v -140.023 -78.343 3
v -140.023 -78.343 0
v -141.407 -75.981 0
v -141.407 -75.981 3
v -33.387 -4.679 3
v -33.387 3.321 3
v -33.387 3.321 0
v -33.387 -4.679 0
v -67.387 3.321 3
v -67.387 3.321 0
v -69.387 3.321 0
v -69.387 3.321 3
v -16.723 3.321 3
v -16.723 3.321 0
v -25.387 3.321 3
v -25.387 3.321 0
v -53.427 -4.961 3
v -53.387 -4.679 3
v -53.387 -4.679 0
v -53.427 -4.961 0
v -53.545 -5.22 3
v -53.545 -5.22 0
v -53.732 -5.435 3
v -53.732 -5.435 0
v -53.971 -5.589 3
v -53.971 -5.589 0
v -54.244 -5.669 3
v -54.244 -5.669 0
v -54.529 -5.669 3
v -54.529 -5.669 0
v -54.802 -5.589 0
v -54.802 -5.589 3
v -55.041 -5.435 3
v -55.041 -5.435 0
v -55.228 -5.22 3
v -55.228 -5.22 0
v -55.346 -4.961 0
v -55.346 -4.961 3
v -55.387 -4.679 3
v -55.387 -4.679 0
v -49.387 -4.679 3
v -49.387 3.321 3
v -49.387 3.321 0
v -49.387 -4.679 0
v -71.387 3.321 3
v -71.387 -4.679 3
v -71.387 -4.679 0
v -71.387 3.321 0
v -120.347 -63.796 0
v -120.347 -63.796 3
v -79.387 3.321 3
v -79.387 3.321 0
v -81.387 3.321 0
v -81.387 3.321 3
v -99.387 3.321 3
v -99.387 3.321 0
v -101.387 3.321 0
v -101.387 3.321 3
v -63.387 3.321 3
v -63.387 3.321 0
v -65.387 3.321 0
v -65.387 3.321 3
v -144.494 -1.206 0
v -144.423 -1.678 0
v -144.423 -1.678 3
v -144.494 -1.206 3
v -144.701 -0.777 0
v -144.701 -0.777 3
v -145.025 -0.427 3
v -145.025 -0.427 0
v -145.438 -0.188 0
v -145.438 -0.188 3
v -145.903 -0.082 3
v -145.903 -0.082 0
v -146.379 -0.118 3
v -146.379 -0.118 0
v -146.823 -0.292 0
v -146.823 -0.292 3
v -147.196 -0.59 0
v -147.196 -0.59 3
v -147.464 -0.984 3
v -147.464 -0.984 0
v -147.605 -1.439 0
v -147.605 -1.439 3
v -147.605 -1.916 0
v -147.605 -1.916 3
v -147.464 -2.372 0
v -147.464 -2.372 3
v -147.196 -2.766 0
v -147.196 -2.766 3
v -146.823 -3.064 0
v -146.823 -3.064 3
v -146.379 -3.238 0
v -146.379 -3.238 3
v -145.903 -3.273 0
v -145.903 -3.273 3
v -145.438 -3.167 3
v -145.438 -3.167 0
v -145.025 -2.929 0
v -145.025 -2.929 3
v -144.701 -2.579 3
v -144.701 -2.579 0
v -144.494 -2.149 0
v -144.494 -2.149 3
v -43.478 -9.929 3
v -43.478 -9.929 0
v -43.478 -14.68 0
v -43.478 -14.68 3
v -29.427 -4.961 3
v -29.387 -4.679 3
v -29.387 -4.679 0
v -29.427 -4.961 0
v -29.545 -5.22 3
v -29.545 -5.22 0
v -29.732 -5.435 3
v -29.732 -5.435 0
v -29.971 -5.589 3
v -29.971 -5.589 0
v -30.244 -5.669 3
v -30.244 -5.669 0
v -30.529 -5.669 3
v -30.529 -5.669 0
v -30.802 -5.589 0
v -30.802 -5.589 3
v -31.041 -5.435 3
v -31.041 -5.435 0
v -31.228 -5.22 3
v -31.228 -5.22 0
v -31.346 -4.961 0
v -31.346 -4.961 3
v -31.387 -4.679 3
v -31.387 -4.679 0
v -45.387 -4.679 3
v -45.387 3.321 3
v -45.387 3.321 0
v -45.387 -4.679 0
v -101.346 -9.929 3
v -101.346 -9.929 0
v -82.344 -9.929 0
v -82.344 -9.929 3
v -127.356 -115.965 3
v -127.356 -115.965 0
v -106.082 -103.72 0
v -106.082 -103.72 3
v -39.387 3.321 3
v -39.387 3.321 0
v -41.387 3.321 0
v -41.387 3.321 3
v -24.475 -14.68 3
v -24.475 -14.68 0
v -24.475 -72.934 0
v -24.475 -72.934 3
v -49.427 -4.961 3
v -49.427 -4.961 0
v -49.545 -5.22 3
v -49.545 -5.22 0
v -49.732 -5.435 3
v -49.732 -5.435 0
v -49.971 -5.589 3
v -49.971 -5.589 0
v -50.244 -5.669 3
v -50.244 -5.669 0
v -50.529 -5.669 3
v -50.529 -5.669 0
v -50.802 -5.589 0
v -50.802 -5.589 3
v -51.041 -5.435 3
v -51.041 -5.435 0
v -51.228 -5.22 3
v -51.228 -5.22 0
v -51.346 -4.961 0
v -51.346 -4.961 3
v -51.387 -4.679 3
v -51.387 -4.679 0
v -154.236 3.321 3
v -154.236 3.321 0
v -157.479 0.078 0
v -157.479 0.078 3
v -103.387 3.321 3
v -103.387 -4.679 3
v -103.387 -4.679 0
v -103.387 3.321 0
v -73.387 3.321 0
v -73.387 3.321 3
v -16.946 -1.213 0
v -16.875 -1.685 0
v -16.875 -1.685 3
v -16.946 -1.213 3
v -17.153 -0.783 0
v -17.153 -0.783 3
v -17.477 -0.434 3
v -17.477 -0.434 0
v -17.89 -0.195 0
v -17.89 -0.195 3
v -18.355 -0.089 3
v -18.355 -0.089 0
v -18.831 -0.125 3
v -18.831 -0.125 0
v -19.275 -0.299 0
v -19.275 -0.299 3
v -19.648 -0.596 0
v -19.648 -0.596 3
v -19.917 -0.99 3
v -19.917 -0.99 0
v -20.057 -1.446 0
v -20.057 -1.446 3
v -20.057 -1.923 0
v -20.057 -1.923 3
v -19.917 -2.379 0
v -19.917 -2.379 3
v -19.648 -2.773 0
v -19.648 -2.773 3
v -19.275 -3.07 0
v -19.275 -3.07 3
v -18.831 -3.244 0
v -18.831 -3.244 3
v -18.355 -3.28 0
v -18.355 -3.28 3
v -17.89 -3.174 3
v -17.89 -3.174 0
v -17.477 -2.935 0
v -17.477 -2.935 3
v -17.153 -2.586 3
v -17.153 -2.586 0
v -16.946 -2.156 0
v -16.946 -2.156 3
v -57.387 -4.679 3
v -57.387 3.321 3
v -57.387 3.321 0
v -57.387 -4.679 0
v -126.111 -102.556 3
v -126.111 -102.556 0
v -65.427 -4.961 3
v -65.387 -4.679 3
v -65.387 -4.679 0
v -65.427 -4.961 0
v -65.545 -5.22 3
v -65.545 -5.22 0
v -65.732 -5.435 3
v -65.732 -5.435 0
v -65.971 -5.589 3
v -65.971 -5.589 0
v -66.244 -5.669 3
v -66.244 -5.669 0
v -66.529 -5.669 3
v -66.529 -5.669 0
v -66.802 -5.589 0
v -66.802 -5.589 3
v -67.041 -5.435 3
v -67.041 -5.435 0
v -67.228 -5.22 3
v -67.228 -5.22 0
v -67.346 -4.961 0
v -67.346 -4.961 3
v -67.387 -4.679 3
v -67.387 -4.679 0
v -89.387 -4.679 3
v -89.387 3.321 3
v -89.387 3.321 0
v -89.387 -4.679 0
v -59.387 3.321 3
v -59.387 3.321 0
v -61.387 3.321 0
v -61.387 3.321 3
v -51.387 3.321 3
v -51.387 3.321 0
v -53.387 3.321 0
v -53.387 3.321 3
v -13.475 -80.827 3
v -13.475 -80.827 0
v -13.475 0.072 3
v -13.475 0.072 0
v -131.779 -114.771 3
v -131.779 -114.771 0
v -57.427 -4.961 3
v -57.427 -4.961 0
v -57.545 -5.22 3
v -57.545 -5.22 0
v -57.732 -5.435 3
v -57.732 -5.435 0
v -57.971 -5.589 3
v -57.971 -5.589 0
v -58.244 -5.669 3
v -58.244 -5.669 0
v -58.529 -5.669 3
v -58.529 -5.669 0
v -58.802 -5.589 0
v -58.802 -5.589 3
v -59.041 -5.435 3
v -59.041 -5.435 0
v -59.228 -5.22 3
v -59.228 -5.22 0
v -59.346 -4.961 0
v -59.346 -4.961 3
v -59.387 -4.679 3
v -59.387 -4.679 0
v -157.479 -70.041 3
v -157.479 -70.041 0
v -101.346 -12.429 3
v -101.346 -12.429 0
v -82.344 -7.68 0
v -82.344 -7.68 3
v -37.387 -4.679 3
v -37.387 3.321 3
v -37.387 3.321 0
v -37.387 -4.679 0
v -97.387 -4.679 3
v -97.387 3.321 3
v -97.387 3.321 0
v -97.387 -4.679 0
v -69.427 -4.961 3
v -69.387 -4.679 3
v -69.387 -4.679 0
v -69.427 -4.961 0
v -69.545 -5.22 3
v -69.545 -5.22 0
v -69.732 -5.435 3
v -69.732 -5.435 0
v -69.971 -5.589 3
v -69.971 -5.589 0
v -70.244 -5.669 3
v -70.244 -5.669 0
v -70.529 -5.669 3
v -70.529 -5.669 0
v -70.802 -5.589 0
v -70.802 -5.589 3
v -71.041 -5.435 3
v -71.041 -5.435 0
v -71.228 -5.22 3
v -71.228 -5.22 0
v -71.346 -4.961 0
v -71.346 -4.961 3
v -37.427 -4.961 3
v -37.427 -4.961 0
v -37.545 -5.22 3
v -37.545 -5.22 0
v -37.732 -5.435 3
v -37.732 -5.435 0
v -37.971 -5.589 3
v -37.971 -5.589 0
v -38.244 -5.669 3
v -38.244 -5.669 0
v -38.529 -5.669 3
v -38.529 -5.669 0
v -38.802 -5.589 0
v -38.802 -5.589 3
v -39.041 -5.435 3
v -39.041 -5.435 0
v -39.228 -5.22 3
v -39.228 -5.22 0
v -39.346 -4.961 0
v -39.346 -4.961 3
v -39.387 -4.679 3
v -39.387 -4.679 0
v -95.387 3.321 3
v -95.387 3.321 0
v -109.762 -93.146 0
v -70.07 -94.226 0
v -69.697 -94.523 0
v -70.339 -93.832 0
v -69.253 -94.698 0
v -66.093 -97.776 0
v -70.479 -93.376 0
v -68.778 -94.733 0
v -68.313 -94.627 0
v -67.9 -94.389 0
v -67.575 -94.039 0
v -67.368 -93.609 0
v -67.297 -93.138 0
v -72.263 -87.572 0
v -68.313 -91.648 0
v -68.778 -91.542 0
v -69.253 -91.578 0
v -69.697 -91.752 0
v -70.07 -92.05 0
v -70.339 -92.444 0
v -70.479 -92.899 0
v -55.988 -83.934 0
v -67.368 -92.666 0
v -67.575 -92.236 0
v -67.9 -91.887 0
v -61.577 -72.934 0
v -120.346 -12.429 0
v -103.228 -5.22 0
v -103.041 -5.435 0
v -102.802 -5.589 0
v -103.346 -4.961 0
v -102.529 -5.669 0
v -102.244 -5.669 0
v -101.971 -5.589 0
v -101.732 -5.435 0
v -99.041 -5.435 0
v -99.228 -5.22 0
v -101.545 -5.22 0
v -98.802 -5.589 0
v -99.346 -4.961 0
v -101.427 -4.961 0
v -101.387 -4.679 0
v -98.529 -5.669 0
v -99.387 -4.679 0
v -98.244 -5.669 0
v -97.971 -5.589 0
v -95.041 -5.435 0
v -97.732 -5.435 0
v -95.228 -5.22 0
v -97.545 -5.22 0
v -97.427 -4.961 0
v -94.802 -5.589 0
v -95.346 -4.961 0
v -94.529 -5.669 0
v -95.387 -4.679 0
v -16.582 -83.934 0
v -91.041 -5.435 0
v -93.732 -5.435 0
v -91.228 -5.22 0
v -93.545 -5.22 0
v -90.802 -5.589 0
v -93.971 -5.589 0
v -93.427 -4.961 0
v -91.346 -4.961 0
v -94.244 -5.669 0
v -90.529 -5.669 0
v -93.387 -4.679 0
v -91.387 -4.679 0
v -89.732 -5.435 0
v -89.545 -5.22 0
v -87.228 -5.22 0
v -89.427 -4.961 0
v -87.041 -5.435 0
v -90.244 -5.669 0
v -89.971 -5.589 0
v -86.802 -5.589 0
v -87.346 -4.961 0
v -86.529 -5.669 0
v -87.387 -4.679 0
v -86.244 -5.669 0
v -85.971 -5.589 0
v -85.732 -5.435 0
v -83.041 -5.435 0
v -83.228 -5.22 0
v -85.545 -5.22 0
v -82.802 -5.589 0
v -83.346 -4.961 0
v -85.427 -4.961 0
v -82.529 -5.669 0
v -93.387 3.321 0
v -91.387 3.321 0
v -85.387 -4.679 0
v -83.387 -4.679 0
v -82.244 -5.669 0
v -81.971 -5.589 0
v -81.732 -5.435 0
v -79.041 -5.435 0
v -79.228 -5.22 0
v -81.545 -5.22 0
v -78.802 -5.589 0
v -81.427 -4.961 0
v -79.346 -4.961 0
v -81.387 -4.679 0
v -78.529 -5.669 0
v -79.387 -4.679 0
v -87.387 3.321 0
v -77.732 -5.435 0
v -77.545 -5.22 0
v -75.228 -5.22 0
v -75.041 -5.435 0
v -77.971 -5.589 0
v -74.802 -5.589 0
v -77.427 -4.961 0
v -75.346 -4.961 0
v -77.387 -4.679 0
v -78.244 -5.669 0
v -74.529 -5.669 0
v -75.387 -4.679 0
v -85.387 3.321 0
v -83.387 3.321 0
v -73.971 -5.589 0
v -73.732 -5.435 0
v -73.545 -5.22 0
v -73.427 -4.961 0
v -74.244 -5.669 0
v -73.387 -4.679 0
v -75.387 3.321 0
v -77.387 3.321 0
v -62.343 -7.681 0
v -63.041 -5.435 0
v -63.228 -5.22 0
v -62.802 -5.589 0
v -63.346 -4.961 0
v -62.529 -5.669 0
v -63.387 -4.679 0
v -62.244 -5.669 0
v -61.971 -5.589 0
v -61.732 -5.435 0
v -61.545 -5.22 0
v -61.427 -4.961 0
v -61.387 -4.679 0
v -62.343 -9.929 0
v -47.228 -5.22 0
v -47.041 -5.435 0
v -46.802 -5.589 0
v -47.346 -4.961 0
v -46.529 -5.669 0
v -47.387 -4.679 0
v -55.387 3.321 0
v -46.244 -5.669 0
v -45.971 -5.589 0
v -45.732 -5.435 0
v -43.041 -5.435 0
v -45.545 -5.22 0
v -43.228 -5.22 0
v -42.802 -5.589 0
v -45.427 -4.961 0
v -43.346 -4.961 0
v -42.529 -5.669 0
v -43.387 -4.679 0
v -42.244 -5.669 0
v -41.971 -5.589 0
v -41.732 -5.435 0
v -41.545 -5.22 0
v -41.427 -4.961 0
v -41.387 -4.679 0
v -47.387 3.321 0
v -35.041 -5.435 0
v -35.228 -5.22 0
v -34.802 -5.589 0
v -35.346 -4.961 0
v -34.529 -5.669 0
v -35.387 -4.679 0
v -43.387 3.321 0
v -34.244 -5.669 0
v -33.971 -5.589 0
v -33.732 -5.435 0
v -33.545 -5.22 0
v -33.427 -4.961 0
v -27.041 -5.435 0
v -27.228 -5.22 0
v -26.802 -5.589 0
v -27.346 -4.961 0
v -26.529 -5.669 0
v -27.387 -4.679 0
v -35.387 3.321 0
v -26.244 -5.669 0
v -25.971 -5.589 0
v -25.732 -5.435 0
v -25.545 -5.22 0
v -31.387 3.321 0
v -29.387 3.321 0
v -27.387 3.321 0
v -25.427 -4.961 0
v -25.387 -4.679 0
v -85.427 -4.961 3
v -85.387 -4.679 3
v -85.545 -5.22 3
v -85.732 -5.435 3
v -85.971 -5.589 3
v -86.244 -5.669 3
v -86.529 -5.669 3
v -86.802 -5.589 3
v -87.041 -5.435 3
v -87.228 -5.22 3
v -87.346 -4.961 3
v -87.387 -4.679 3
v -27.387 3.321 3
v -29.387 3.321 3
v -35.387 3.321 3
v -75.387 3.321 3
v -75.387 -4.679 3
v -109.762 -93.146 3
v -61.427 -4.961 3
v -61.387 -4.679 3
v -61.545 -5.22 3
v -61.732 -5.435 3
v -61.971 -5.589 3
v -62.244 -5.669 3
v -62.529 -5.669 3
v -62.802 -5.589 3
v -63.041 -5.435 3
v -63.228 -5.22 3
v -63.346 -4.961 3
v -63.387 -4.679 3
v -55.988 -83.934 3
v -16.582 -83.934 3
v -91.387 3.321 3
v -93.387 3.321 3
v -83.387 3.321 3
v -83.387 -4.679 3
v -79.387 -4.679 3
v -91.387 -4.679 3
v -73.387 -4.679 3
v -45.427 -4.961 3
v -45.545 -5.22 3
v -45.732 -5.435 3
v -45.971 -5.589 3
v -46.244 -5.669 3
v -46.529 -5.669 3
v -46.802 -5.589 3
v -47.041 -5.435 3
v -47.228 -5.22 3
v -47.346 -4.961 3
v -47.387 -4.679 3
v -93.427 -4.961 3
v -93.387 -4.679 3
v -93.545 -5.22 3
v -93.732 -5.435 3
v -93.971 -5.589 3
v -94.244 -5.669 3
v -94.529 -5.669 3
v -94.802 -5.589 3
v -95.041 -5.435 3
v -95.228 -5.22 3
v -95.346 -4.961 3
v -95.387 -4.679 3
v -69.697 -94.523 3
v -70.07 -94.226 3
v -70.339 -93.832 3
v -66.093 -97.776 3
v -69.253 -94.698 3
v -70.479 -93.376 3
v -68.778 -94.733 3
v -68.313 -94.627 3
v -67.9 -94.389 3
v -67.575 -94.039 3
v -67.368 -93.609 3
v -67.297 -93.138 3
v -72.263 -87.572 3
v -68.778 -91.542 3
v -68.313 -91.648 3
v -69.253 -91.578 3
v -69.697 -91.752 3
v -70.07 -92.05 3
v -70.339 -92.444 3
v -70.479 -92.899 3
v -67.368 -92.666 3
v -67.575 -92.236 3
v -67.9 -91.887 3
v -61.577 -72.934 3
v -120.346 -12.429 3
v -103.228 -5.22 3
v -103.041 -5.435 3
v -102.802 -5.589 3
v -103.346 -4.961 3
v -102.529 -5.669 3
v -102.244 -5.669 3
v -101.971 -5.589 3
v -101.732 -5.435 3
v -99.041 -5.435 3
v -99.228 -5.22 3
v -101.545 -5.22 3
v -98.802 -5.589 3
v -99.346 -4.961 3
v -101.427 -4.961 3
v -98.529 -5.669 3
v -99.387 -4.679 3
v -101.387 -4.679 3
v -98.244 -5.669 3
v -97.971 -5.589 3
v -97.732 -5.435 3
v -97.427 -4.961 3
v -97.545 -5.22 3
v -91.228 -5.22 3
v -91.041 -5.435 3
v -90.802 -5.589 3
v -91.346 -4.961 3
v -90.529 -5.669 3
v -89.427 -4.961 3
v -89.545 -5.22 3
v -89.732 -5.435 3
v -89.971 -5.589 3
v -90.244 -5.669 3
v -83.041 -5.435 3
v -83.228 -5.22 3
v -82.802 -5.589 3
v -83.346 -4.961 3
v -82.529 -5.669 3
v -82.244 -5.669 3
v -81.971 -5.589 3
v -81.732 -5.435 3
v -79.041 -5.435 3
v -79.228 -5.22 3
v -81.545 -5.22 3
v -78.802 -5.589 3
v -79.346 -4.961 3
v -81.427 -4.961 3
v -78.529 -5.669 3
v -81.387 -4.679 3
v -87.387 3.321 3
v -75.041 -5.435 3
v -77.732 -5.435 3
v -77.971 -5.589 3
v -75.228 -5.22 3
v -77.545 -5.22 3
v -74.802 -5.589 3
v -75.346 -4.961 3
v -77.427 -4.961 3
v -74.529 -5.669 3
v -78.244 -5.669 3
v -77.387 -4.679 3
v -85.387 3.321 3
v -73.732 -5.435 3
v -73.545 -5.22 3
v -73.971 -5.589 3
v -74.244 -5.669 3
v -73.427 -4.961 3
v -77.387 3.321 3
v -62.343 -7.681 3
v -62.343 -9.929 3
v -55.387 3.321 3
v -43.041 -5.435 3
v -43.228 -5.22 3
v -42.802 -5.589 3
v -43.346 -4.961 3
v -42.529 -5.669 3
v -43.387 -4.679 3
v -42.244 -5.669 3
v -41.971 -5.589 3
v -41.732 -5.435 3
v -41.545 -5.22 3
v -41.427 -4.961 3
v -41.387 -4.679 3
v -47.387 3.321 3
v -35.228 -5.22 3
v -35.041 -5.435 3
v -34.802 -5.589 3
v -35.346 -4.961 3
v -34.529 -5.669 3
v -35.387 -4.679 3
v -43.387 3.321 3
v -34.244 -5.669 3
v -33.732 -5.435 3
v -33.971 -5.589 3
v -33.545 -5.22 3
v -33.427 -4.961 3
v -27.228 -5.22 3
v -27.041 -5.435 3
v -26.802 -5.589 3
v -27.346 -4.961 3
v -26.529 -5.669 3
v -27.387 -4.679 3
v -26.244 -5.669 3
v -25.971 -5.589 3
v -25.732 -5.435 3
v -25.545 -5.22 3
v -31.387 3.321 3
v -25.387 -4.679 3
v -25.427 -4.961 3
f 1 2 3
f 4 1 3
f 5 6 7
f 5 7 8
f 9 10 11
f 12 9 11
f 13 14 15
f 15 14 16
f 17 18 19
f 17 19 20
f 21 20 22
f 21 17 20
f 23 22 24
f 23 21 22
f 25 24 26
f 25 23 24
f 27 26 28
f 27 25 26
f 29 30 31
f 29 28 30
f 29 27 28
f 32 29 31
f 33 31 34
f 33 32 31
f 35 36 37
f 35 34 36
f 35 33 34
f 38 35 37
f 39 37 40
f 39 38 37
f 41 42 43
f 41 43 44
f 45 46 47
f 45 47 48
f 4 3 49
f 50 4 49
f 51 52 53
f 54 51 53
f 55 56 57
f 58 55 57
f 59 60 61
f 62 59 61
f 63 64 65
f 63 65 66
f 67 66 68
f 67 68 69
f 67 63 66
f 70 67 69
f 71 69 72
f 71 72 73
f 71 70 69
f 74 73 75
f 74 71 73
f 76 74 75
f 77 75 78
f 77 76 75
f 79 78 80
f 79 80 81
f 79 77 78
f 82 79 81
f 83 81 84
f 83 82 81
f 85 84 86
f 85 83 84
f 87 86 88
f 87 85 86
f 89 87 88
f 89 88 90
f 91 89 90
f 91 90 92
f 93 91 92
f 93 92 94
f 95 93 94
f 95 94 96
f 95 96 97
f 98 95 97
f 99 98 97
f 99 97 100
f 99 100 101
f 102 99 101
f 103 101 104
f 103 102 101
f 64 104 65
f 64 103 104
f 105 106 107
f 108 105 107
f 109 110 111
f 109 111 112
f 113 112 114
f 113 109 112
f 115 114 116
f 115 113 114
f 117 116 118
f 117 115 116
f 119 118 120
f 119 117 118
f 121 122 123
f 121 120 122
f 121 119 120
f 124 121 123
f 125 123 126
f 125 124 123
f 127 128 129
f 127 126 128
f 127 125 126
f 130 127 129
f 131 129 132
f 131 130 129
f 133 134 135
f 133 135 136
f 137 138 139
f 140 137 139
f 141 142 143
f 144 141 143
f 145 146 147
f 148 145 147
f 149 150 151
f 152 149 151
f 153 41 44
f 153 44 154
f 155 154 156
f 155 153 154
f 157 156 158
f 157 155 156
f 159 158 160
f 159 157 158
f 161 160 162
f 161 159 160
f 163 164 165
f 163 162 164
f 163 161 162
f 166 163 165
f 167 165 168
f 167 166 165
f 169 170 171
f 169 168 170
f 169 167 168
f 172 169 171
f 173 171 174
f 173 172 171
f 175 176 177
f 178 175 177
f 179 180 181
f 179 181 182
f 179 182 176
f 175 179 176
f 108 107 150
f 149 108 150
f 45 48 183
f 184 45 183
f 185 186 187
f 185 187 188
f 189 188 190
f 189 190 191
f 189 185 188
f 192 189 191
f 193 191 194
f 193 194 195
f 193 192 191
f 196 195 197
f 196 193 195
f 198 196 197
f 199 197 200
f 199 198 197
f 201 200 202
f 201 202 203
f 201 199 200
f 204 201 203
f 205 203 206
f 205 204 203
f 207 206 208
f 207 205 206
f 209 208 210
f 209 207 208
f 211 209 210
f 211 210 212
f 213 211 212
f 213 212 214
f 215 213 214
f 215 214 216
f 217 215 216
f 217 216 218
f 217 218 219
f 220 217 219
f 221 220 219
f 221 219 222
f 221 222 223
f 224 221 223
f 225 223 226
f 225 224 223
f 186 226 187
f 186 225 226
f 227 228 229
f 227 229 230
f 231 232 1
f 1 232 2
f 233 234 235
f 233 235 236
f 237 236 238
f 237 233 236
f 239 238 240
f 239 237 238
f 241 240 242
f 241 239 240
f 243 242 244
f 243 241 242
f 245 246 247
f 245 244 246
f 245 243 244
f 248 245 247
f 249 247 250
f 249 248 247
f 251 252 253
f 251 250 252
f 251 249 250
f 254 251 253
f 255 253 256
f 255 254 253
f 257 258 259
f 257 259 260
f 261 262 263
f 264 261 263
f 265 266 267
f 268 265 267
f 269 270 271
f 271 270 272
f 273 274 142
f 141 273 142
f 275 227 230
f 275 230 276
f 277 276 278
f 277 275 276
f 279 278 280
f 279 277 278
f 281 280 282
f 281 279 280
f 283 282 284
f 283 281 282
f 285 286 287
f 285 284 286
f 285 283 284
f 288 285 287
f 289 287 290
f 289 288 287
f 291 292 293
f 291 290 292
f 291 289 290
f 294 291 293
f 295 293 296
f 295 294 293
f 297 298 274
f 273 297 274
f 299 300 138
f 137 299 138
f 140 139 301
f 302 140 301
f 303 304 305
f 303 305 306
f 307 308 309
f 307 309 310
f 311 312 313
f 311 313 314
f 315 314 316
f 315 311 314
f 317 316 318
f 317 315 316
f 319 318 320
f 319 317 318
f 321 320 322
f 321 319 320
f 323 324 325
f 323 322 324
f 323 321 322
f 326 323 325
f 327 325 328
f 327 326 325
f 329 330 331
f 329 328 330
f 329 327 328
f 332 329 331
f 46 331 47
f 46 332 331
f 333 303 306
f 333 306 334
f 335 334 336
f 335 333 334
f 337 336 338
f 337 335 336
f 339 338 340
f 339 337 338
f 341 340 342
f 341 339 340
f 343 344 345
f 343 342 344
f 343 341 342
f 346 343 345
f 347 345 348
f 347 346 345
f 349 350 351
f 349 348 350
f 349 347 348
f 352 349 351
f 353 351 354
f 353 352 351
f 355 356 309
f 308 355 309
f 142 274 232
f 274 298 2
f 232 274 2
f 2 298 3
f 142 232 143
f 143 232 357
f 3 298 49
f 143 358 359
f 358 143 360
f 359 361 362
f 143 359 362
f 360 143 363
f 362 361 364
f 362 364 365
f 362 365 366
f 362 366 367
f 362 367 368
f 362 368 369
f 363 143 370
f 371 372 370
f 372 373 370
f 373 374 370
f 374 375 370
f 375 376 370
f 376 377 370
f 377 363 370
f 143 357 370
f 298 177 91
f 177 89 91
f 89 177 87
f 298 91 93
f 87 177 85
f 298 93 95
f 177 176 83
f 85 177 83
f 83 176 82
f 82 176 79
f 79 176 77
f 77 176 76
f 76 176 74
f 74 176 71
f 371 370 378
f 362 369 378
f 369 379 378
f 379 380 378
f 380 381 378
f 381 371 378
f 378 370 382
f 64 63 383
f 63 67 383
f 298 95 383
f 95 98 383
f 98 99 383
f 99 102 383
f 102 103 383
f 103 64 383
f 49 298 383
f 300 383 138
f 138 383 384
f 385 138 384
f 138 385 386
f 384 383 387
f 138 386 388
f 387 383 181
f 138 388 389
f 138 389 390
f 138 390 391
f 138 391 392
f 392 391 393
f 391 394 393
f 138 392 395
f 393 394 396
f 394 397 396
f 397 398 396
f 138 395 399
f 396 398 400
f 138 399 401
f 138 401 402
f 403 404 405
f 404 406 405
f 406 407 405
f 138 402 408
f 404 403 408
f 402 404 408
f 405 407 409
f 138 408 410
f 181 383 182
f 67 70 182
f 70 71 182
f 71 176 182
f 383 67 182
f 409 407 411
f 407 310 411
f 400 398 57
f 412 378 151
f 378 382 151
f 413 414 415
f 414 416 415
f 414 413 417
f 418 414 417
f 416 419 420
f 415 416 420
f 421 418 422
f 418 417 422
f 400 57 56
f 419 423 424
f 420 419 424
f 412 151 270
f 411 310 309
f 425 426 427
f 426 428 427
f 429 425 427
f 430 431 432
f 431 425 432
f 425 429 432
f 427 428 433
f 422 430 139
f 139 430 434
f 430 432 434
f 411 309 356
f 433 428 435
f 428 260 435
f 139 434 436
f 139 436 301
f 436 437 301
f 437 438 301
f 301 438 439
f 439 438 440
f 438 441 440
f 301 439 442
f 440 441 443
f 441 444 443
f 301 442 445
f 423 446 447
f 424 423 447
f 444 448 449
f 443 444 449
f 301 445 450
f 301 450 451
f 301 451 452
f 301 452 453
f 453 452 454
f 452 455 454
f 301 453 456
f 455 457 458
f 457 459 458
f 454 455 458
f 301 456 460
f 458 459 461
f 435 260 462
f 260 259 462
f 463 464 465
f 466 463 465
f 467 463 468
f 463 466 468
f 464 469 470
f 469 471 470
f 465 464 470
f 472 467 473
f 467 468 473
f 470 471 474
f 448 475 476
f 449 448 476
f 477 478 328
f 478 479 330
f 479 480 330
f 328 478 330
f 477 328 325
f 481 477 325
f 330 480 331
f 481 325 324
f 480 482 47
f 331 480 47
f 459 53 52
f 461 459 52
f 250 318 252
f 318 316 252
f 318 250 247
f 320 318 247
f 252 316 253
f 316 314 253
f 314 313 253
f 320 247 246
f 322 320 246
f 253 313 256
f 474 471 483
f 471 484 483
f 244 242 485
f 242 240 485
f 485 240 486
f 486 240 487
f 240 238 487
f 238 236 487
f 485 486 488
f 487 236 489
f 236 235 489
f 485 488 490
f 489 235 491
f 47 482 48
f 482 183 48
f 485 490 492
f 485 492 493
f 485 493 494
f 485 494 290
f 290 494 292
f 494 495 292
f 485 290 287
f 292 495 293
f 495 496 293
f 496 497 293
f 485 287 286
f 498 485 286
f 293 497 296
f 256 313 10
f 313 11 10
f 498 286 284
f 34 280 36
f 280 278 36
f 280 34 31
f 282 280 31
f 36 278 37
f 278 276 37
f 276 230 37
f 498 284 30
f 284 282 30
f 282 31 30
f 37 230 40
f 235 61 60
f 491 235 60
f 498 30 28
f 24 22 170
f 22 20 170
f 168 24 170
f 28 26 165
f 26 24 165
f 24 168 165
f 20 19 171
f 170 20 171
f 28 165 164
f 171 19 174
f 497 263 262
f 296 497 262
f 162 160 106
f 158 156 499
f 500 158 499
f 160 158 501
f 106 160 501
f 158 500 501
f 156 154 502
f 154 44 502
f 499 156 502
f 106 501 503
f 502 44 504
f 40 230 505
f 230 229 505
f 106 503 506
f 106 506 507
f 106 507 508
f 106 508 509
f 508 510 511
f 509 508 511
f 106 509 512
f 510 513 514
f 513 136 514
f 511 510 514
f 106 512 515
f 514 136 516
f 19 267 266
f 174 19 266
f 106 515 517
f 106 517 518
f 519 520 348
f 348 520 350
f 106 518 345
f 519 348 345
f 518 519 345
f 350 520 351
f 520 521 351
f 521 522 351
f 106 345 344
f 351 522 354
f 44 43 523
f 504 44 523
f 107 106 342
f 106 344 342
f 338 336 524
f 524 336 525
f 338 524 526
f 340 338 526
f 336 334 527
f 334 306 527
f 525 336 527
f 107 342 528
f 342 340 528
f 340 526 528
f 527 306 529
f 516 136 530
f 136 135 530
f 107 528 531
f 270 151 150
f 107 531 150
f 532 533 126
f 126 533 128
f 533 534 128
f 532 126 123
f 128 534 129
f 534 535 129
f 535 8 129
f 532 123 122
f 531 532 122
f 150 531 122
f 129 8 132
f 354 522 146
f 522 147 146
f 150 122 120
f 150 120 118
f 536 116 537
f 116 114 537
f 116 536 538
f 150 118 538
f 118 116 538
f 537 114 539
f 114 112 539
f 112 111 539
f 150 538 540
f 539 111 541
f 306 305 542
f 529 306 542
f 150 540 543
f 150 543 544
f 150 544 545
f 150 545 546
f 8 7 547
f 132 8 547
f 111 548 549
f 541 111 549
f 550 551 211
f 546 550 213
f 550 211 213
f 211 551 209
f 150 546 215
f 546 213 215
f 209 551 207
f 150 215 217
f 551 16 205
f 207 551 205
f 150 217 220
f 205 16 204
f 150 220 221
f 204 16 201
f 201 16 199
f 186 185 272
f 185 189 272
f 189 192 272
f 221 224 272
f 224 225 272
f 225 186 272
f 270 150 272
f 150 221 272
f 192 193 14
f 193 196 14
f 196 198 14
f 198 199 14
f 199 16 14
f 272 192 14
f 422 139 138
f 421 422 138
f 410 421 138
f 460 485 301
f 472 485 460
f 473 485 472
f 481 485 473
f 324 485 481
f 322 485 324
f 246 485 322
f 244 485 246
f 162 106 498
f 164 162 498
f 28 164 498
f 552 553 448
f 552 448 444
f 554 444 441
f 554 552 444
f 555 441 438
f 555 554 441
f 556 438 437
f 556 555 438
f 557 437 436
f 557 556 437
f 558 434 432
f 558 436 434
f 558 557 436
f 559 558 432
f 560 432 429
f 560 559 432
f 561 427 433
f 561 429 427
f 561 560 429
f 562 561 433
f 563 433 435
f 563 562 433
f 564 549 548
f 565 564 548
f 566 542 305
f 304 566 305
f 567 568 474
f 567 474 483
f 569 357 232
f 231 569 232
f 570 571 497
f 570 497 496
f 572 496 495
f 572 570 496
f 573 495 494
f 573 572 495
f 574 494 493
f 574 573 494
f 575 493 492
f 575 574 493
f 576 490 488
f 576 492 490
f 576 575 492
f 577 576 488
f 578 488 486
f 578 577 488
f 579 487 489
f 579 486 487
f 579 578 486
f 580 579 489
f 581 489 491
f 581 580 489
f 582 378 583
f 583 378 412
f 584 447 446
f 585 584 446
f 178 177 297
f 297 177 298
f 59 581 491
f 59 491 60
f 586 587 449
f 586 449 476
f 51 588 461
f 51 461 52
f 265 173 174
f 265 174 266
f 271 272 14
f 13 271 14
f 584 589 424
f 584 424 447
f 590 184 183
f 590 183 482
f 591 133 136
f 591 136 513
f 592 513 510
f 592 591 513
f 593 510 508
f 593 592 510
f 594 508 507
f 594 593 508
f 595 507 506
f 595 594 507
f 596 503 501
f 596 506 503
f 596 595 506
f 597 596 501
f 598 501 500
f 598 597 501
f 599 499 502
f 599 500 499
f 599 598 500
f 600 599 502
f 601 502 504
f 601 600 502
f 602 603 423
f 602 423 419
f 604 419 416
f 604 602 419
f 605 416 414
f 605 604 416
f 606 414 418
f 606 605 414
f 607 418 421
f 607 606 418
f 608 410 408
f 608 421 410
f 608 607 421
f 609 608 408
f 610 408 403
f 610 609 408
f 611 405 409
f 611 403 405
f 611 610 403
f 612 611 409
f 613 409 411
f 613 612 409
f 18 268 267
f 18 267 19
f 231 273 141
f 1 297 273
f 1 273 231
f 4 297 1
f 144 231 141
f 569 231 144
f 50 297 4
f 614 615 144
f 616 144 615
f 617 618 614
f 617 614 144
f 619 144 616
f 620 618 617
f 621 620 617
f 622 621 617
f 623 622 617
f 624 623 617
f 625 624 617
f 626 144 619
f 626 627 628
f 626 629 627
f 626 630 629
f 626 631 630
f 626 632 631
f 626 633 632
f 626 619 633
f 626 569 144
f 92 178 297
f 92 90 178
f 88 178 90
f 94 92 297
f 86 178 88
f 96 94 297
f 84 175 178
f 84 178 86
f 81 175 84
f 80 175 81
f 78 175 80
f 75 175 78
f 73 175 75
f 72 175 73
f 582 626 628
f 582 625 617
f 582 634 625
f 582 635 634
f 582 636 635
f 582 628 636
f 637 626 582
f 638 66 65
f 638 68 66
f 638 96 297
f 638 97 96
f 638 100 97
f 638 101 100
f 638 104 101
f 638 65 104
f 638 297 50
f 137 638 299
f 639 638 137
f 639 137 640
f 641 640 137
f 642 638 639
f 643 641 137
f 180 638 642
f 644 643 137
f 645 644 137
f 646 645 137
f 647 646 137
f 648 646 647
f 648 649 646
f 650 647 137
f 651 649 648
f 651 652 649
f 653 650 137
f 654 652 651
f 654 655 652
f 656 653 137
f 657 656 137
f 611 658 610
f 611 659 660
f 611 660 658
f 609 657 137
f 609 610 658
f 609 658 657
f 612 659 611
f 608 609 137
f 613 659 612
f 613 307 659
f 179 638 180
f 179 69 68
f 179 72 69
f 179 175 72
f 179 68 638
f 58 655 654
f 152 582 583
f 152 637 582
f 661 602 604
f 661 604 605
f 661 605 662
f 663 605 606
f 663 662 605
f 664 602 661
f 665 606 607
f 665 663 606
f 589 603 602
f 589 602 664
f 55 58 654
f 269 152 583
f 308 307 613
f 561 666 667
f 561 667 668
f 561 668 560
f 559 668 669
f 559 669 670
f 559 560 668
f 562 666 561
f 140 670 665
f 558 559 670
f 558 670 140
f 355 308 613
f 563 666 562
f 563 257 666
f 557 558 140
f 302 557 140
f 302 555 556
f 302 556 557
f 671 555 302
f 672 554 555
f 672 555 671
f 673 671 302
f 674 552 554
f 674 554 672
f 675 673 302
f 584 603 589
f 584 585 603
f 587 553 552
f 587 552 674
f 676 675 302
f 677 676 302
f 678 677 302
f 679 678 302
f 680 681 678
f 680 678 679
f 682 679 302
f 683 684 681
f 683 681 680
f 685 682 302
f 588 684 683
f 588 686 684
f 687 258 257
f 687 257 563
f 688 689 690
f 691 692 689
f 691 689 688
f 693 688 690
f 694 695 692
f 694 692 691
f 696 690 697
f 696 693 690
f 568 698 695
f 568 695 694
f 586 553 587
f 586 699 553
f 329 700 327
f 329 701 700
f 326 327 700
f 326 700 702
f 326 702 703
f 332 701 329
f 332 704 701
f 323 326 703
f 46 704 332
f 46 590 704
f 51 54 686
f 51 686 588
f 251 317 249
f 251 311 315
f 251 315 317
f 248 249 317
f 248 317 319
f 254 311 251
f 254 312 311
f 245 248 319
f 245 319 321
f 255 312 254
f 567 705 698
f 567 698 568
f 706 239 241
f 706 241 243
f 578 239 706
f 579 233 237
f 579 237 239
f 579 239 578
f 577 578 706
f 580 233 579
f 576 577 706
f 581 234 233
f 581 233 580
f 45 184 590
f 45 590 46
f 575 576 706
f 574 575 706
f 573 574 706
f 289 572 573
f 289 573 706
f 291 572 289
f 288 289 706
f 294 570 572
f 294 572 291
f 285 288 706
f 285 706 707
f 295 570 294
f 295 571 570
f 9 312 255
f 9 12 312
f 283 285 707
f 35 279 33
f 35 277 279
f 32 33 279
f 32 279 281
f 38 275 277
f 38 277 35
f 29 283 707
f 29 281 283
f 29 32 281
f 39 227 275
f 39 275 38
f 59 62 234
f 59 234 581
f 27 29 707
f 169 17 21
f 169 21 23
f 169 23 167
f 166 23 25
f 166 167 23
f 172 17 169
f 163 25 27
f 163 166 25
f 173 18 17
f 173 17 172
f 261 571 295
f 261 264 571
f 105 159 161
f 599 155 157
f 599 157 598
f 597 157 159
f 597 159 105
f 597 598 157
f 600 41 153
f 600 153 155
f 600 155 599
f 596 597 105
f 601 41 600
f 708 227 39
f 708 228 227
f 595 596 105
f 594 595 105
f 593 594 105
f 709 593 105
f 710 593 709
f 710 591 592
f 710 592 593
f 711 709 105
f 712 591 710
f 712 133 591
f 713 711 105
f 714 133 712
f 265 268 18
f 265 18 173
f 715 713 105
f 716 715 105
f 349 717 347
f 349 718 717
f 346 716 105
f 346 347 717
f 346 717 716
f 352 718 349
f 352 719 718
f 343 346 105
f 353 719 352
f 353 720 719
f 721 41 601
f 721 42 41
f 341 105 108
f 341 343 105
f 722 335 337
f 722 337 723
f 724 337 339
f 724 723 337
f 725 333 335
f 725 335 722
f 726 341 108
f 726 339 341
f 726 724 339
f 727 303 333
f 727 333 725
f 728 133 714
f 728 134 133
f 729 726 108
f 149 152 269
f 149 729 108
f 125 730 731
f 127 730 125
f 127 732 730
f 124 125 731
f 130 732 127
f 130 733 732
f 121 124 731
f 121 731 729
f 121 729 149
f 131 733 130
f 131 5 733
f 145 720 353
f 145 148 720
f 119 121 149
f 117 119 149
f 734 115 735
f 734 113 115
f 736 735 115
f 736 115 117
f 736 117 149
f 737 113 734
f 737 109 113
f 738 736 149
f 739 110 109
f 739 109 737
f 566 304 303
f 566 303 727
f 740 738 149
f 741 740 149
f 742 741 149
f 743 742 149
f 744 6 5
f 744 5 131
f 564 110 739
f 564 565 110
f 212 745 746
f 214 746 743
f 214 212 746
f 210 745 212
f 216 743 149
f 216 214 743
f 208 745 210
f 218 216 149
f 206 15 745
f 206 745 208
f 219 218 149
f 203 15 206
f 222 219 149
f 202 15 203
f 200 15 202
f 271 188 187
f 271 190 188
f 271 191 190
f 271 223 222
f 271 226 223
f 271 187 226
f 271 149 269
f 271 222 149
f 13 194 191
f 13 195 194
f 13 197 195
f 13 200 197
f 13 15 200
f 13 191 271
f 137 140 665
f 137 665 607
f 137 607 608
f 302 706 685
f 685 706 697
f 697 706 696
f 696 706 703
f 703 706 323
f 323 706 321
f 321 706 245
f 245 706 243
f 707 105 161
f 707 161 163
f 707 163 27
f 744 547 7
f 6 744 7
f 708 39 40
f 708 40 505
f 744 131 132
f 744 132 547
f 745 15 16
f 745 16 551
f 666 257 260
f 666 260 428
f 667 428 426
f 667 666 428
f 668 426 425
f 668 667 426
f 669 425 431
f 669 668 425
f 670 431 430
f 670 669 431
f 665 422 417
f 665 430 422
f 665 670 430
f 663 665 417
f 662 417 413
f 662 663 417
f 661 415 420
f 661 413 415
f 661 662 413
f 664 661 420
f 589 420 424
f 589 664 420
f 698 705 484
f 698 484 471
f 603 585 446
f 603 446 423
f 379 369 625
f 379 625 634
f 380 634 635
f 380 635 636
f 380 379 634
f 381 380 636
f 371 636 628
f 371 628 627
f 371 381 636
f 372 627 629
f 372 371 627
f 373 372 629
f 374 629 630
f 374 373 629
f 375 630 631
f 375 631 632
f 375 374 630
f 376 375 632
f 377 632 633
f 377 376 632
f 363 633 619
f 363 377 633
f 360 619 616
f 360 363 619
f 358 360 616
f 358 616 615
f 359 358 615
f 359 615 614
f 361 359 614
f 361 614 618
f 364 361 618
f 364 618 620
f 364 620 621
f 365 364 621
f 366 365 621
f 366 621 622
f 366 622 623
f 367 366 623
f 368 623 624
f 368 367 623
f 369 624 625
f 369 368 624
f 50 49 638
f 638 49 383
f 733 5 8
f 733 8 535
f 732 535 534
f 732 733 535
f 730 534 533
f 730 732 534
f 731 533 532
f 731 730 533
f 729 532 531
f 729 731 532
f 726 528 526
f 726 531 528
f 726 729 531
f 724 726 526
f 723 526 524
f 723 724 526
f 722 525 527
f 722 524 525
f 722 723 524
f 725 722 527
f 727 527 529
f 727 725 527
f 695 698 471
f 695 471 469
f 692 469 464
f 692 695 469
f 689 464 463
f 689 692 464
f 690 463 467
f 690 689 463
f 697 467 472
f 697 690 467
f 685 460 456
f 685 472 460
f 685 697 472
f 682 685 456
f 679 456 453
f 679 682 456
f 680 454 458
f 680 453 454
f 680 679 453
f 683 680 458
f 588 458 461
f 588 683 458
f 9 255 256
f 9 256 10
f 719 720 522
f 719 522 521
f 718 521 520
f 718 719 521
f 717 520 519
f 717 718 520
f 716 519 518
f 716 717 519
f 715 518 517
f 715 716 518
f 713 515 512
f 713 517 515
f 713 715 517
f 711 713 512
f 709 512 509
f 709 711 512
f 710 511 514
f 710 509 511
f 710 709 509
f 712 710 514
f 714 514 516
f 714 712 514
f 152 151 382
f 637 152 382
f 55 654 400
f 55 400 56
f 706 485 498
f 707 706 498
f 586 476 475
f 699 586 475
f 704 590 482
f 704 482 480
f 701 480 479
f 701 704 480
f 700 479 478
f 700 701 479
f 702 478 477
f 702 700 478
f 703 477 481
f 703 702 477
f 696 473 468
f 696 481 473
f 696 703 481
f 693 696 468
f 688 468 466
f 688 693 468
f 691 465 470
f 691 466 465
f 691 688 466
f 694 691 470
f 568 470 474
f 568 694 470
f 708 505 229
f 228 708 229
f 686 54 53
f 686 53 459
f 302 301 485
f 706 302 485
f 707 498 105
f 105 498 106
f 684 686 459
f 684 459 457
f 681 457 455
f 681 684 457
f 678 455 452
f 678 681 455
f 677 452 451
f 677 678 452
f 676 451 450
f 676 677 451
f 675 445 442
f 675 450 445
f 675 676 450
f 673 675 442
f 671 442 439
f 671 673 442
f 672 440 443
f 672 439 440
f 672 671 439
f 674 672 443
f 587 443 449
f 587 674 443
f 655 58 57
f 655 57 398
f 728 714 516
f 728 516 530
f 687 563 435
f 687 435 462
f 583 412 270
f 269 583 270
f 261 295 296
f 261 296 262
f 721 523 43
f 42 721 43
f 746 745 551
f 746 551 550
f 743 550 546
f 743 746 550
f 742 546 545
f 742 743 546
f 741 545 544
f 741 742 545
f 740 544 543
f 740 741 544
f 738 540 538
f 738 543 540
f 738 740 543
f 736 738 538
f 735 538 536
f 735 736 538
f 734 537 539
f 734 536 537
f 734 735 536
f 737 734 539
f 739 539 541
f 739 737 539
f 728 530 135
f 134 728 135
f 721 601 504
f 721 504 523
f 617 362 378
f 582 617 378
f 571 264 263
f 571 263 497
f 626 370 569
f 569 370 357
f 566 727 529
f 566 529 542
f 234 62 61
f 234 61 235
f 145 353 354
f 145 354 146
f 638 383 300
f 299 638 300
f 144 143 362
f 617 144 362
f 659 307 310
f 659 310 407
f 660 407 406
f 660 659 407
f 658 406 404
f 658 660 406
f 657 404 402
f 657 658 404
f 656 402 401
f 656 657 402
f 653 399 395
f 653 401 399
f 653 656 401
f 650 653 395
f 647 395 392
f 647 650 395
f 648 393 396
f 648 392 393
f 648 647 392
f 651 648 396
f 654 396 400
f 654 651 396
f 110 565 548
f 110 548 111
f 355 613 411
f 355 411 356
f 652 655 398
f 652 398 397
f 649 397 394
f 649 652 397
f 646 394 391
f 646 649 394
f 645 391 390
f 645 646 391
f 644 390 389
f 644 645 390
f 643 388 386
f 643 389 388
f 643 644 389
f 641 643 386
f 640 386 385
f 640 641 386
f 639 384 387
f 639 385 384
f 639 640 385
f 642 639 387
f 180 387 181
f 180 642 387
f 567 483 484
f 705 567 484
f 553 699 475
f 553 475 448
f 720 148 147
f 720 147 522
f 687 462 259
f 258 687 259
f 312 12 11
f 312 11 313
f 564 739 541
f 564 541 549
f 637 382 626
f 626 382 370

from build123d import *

# Parameters (mm, degrees)
ESQUISSE1_R             = 1.6
BOSS_EXTRU_1_DEPTH      = 3
ENL_V_MAT_EXTRU_1_DEPTH = 10


with BuildPart() as part:
    # Esquisse1 → Boss.-Extru.1 (new body)
    with BuildSketch(Plane.XY):
        Polygon((-13.474992457, 0.072428093), (-16.723236211, 3.320852512), (-154.236345188, 3.320852512), (-157.478985875, 0.078211825), (-157.478985875, -70.04068474), (-131.779420125, -114.771472067), (-127.355917516, -115.9649154), (-106.081983802, -103.720194839), (-66.092540926, -97.775797545), (-55.98795635, -83.933633781), (-16.581747648, -83.933633781), (-13.474992457, -80.826878591), align=None)
        Polygon((-126.111124489, -102.556497988), (-140.02282508, -78.342807898), (-141.407217303, -75.981121034), (-120.346626934, -63.796065222), (-120.346308835, -12.429484403), (-101.345774335, -12.429484403), (-101.345774335, -9.929307079), (-82.344426674, -9.929307079), (-82.344426674, -7.679926158), (-62.343149943, -7.681038584), (-62.343149943, -9.929307079), (-43.477687779, -9.929307079), (-43.477687779, -14.679643994), (-24.474992457, -14.679643994), (-24.474992457, -72.933633781), (-61.577157206, -72.933633781), (-72.263087593, -87.572177036), (-109.761976756, -93.1463556), align=None, mode=Mode.SUBTRACT)
        with Locations((-68.897334865, -93.137788223)):
            Circle(ESQUISSE1_R, mode=Mode.SUBTRACT)
        with Locations((-146.02282508, -1.677868186)):
            Circle(ESQUISSE1_R, mode=Mode.SUBTRACT)
        with Locations((-18.474992457, -1.68453516)):
            Circle(ESQUISSE1_R, mode=Mode.SUBTRACT)
    extrude(amount=BOSS_EXTRU_1_DEPTH)

    # Esquisse2 → Enlèv. mat.-Extru.1 (cut)
    with BuildSketch(Plane.XY.offset(3)):
        with BuildLine():
            Line((-25.386559375, 6.054162745), (-25.386559375, -4.679147488))
            ThreePointArc((-25.386559375, -4.679147488), (-26.386559375, -5.679147488), (-27.386559375, -4.679147488))
            Line((-27.386559375, -4.679147488), (-27.386559375, 6.054162745))
            ThreePointArc((-27.386559375, 6.054162745), (-26.386559375, 7.054162745), (-25.386559375, 6.054162745))
        make_face()
        with BuildLine():
            Line((-29.386559375, 6.054162745), (-29.386559375, -4.679147488))
            ThreePointArc((-29.386559375, -4.679147488), (-30.386559375, -5.679147488), (-31.386559375, -4.679147488))
            Line((-31.386559375, -4.679147488), (-31.386559375, 6.054162745))
            ThreePointArc((-31.386559375, 6.054162745), (-30.386559375, 7.054162745), (-29.386559375, 6.054162745))
        make_face()
        with BuildLine():
            Line((-33.386559375, 6.054162745), (-33.386559375, -4.679147488))
            ThreePointArc((-33.386559375, -4.679147488), (-34.386559375, -5.679147488), (-35.386559375, -4.679147488))
            Line((-35.386559375, -4.679147488), (-35.386559375, 6.054162745))
            ThreePointArc((-35.386559375, 6.054162745), (-34.386559375, 7.054162745), (-33.386559375, 6.054162745))
        make_face()
        with BuildLine():
            Line((-37.386559375, 6.054162745), (-37.386559375, -4.679147488))
            ThreePointArc((-37.386559375, -4.679147488), (-38.386559375, -5.679147488), (-39.386559375, -4.679147488))
            Line((-39.386559375, -4.679147488), (-39.386559375, 6.054162745))
            ThreePointArc((-39.386559375, 6.054162745), (-38.386559375, 7.054162745), (-37.386559375, 6.054162745))
        make_face()
        with BuildLine():
            Line((-41.386559375, 6.054162745), (-41.386559375, -4.679147488))
            ThreePointArc((-41.386559375, -4.679147488), (-42.386559375, -5.679147488), (-43.386559375, -4.679147488))
            Line((-43.386559375, -4.679147488), (-43.386559375, 6.054162745))
            ThreePointArc((-43.386559375, 6.054162745), (-42.386559375, 7.054162745), (-41.386559375, 6.054162745))
        make_face()
        with BuildLine():
            Line((-45.386559375, 6.054162745), (-45.386559375, -4.679147488))
            ThreePointArc((-45.386559375, -4.679147488), (-46.386559375, -5.679147488), (-47.386559375, -4.679147488))
            Line((-47.386559375, -4.679147488), (-47.386559375, 6.054162745))
            ThreePointArc((-47.386559375, 6.054162745), (-46.386559375, 7.054162745), (-45.386559375, 6.054162745))
        make_face()
        with BuildLine():
            Line((-49.386559375, 6.054162745), (-49.386559375, -4.679147488))
            ThreePointArc((-49.386559375, -4.679147488), (-50.386559375, -5.679147488), (-51.386559375, -4.679147488))
            Line((-51.386559375, -4.679147488), (-51.386559375, 6.054162745))
            ThreePointArc((-51.386559375, 6.054162745), (-50.386559375, 7.054162745), (-49.386559375, 6.054162745))
        make_face()
        with BuildLine():
            Line((-53.386559375, 6.054162745), (-53.386559375, -4.679147488))
            ThreePointArc((-53.386559375, -4.679147488), (-54.386559375, -5.679147488), (-55.386559375, -4.679147488))
            Line((-55.386559375, -4.679147488), (-55.386559375, 6.054162745))
            ThreePointArc((-55.386559375, 6.054162745), (-54.386559375, 7.054162745), (-53.386559375, 6.054162745))
        make_face()
        with BuildLine():
            Line((-57.386559375, 6.054162745), (-57.386559375, -4.679147488))
            ThreePointArc((-57.386559375, -4.679147488), (-58.386559375, -5.679147488), (-59.386559375, -4.679147488))
            Line((-59.386559375, -4.679147488), (-59.386559375, 6.054162745))
            ThreePointArc((-59.386559375, 6.054162745), (-58.386559375, 7.054162745), (-57.386559375, 6.054162745))
        make_face()
        with BuildLine():
            Line((-61.386559375, 6.054162745), (-61.386559375, -4.679147488))
            ThreePointArc((-61.386559375, -4.679147488), (-62.386559375, -5.679147488), (-63.386559375, -4.679147488))
            Line((-63.386559375, -4.679147488), (-63.386559375, 6.054162745))
            ThreePointArc((-63.386559375, 6.054162745), (-62.386559375, 7.054162745), (-61.386559375, 6.054162745))
        make_face()
        with BuildLine():
            Line((-65.386559375, 6.054162745), (-65.386559375, -4.679147488))
            ThreePointArc((-65.386559375, -4.679147488), (-66.386559375, -5.679147488), (-67.386559375, -4.679147488))
            Line((-67.386559375, -4.679147488), (-67.386559375, 6.054162745))
            ThreePointArc((-67.386559375, 6.054162745), (-66.386559375, 7.054162745), (-65.386559375, 6.054162745))
        make_face()
        with BuildLine():
            Line((-69.386559375, 6.054162745), (-69.386559375, -4.679147488))
            ThreePointArc((-69.386559375, -4.679147488), (-70.386559375, -5.679147488), (-71.386559375, -4.679147488))
            Line((-71.386559375, -4.679147488), (-71.386559375, 6.054162745))
            ThreePointArc((-71.386559375, 6.054162745), (-70.386559375, 7.054162745), (-69.386559375, 6.054162745))
        make_face()
        with BuildLine():
            Line((-73.386559375, 6.054162745), (-73.386559375, -4.679147488))
            ThreePointArc((-73.386559375, -4.679147488), (-74.386559375, -5.679147488), (-75.386559375, -4.679147488))
            Line((-75.386559375, -4.679147488), (-75.386559375, 6.054162745))
            ThreePointArc((-75.386559375, 6.054162745), (-74.386559375, 7.054162745), (-73.386559375, 6.054162745))
        make_face()
        with BuildLine():
            Line((-77.386559375, 6.054162745), (-77.386559375, -4.679147488))
            ThreePointArc((-77.386559375, -4.679147488), (-78.386559375, -5.679147488), (-79.386559375, -4.679147488))
            Line((-79.386559375, -4.679147488), (-79.386559375, 6.054162745))
            ThreePointArc((-79.386559375, 6.054162745), (-78.386559375, 7.054162745), (-77.386559375, 6.054162745))
        make_face()
        with BuildLine():
            Line((-81.386559375, 6.054162745), (-81.386559375, -4.679147488))
            ThreePointArc((-81.386559375, -4.679147488), (-82.386559375, -5.679147488), (-83.386559375, -4.679147488))
            Line((-83.386559375, -4.679147488), (-83.386559375, 6.054162745))
            ThreePointArc((-83.386559375, 6.054162745), (-82.386559375, 7.054162745), (-81.386559375, 6.054162745))
        make_face()
        with BuildLine():
            Line((-85.386559375, 6.054162745), (-85.386559375, -4.679147488))
            ThreePointArc((-85.386559375, -4.679147488), (-86.386559375, -5.679147488), (-87.386559375, -4.679147488))
            Line((-87.386559375, -4.679147488), (-87.386559375, 6.054162745))
            ThreePointArc((-87.386559375, 6.054162745), (-86.386559375, 7.054162745), (-85.386559375, 6.054162745))
        make_face()
        with BuildLine():
            Line((-89.386559375, 6.054162745), (-89.386559375, -4.679147488))
            ThreePointArc((-89.386559375, -4.679147488), (-90.386559375, -5.679147488), (-91.386559375, -4.679147488))
            Line((-91.386559375, -4.679147488), (-91.386559375, 6.054162745))
            ThreePointArc((-91.386559375, 6.054162745), (-90.386559375, 7.054162745), (-89.386559375, 6.054162745))
        make_face()
        with BuildLine():
            Line((-93.386559375, 6.054162745), (-93.386559375, -4.679147488))
            ThreePointArc((-93.386559375, -4.679147488), (-94.386559375, -5.679147488), (-95.386559375, -4.679147488))
            Line((-95.386559375, -4.679147488), (-95.386559375, 6.054162745))
            ThreePointArc((-95.386559375, 6.054162745), (-94.386559375, 7.054162745), (-93.386559375, 6.054162745))
        make_face()
        with BuildLine():
            Line((-97.386559375, 6.054162745), (-97.386559375, -4.679147488))
            ThreePointArc((-97.386559375, -4.679147488), (-98.386559375, -5.679147488), (-99.386559375, -4.679147488))
            Line((-99.386559375, -4.679147488), (-99.386559375, 6.054162745))
            ThreePointArc((-99.386559375, 6.054162745), (-98.386559375, 7.054162745), (-97.386559375, 6.054162745))
        make_face()
        with BuildLine():
            Line((-101.386559375, 6.054162745), (-101.386559375, -4.679147488))
            ThreePointArc((-101.386559375, -4.679147488), (-102.386559375, -5.679147488), (-103.386559375, -4.679147488))
            Line((-103.386559375, -4.679147488), (-103.386559375, 6.054162745))
            ThreePointArc((-103.386559375, 6.054162745), (-102.386559375, 7.054162745), (-101.386559375, 6.054162745))
        make_face()
    extrude(amount=-ENL_V_MAT_EXTRU_1_DEPTH, mode=Mode.SUBTRACT)


solid = part.part
